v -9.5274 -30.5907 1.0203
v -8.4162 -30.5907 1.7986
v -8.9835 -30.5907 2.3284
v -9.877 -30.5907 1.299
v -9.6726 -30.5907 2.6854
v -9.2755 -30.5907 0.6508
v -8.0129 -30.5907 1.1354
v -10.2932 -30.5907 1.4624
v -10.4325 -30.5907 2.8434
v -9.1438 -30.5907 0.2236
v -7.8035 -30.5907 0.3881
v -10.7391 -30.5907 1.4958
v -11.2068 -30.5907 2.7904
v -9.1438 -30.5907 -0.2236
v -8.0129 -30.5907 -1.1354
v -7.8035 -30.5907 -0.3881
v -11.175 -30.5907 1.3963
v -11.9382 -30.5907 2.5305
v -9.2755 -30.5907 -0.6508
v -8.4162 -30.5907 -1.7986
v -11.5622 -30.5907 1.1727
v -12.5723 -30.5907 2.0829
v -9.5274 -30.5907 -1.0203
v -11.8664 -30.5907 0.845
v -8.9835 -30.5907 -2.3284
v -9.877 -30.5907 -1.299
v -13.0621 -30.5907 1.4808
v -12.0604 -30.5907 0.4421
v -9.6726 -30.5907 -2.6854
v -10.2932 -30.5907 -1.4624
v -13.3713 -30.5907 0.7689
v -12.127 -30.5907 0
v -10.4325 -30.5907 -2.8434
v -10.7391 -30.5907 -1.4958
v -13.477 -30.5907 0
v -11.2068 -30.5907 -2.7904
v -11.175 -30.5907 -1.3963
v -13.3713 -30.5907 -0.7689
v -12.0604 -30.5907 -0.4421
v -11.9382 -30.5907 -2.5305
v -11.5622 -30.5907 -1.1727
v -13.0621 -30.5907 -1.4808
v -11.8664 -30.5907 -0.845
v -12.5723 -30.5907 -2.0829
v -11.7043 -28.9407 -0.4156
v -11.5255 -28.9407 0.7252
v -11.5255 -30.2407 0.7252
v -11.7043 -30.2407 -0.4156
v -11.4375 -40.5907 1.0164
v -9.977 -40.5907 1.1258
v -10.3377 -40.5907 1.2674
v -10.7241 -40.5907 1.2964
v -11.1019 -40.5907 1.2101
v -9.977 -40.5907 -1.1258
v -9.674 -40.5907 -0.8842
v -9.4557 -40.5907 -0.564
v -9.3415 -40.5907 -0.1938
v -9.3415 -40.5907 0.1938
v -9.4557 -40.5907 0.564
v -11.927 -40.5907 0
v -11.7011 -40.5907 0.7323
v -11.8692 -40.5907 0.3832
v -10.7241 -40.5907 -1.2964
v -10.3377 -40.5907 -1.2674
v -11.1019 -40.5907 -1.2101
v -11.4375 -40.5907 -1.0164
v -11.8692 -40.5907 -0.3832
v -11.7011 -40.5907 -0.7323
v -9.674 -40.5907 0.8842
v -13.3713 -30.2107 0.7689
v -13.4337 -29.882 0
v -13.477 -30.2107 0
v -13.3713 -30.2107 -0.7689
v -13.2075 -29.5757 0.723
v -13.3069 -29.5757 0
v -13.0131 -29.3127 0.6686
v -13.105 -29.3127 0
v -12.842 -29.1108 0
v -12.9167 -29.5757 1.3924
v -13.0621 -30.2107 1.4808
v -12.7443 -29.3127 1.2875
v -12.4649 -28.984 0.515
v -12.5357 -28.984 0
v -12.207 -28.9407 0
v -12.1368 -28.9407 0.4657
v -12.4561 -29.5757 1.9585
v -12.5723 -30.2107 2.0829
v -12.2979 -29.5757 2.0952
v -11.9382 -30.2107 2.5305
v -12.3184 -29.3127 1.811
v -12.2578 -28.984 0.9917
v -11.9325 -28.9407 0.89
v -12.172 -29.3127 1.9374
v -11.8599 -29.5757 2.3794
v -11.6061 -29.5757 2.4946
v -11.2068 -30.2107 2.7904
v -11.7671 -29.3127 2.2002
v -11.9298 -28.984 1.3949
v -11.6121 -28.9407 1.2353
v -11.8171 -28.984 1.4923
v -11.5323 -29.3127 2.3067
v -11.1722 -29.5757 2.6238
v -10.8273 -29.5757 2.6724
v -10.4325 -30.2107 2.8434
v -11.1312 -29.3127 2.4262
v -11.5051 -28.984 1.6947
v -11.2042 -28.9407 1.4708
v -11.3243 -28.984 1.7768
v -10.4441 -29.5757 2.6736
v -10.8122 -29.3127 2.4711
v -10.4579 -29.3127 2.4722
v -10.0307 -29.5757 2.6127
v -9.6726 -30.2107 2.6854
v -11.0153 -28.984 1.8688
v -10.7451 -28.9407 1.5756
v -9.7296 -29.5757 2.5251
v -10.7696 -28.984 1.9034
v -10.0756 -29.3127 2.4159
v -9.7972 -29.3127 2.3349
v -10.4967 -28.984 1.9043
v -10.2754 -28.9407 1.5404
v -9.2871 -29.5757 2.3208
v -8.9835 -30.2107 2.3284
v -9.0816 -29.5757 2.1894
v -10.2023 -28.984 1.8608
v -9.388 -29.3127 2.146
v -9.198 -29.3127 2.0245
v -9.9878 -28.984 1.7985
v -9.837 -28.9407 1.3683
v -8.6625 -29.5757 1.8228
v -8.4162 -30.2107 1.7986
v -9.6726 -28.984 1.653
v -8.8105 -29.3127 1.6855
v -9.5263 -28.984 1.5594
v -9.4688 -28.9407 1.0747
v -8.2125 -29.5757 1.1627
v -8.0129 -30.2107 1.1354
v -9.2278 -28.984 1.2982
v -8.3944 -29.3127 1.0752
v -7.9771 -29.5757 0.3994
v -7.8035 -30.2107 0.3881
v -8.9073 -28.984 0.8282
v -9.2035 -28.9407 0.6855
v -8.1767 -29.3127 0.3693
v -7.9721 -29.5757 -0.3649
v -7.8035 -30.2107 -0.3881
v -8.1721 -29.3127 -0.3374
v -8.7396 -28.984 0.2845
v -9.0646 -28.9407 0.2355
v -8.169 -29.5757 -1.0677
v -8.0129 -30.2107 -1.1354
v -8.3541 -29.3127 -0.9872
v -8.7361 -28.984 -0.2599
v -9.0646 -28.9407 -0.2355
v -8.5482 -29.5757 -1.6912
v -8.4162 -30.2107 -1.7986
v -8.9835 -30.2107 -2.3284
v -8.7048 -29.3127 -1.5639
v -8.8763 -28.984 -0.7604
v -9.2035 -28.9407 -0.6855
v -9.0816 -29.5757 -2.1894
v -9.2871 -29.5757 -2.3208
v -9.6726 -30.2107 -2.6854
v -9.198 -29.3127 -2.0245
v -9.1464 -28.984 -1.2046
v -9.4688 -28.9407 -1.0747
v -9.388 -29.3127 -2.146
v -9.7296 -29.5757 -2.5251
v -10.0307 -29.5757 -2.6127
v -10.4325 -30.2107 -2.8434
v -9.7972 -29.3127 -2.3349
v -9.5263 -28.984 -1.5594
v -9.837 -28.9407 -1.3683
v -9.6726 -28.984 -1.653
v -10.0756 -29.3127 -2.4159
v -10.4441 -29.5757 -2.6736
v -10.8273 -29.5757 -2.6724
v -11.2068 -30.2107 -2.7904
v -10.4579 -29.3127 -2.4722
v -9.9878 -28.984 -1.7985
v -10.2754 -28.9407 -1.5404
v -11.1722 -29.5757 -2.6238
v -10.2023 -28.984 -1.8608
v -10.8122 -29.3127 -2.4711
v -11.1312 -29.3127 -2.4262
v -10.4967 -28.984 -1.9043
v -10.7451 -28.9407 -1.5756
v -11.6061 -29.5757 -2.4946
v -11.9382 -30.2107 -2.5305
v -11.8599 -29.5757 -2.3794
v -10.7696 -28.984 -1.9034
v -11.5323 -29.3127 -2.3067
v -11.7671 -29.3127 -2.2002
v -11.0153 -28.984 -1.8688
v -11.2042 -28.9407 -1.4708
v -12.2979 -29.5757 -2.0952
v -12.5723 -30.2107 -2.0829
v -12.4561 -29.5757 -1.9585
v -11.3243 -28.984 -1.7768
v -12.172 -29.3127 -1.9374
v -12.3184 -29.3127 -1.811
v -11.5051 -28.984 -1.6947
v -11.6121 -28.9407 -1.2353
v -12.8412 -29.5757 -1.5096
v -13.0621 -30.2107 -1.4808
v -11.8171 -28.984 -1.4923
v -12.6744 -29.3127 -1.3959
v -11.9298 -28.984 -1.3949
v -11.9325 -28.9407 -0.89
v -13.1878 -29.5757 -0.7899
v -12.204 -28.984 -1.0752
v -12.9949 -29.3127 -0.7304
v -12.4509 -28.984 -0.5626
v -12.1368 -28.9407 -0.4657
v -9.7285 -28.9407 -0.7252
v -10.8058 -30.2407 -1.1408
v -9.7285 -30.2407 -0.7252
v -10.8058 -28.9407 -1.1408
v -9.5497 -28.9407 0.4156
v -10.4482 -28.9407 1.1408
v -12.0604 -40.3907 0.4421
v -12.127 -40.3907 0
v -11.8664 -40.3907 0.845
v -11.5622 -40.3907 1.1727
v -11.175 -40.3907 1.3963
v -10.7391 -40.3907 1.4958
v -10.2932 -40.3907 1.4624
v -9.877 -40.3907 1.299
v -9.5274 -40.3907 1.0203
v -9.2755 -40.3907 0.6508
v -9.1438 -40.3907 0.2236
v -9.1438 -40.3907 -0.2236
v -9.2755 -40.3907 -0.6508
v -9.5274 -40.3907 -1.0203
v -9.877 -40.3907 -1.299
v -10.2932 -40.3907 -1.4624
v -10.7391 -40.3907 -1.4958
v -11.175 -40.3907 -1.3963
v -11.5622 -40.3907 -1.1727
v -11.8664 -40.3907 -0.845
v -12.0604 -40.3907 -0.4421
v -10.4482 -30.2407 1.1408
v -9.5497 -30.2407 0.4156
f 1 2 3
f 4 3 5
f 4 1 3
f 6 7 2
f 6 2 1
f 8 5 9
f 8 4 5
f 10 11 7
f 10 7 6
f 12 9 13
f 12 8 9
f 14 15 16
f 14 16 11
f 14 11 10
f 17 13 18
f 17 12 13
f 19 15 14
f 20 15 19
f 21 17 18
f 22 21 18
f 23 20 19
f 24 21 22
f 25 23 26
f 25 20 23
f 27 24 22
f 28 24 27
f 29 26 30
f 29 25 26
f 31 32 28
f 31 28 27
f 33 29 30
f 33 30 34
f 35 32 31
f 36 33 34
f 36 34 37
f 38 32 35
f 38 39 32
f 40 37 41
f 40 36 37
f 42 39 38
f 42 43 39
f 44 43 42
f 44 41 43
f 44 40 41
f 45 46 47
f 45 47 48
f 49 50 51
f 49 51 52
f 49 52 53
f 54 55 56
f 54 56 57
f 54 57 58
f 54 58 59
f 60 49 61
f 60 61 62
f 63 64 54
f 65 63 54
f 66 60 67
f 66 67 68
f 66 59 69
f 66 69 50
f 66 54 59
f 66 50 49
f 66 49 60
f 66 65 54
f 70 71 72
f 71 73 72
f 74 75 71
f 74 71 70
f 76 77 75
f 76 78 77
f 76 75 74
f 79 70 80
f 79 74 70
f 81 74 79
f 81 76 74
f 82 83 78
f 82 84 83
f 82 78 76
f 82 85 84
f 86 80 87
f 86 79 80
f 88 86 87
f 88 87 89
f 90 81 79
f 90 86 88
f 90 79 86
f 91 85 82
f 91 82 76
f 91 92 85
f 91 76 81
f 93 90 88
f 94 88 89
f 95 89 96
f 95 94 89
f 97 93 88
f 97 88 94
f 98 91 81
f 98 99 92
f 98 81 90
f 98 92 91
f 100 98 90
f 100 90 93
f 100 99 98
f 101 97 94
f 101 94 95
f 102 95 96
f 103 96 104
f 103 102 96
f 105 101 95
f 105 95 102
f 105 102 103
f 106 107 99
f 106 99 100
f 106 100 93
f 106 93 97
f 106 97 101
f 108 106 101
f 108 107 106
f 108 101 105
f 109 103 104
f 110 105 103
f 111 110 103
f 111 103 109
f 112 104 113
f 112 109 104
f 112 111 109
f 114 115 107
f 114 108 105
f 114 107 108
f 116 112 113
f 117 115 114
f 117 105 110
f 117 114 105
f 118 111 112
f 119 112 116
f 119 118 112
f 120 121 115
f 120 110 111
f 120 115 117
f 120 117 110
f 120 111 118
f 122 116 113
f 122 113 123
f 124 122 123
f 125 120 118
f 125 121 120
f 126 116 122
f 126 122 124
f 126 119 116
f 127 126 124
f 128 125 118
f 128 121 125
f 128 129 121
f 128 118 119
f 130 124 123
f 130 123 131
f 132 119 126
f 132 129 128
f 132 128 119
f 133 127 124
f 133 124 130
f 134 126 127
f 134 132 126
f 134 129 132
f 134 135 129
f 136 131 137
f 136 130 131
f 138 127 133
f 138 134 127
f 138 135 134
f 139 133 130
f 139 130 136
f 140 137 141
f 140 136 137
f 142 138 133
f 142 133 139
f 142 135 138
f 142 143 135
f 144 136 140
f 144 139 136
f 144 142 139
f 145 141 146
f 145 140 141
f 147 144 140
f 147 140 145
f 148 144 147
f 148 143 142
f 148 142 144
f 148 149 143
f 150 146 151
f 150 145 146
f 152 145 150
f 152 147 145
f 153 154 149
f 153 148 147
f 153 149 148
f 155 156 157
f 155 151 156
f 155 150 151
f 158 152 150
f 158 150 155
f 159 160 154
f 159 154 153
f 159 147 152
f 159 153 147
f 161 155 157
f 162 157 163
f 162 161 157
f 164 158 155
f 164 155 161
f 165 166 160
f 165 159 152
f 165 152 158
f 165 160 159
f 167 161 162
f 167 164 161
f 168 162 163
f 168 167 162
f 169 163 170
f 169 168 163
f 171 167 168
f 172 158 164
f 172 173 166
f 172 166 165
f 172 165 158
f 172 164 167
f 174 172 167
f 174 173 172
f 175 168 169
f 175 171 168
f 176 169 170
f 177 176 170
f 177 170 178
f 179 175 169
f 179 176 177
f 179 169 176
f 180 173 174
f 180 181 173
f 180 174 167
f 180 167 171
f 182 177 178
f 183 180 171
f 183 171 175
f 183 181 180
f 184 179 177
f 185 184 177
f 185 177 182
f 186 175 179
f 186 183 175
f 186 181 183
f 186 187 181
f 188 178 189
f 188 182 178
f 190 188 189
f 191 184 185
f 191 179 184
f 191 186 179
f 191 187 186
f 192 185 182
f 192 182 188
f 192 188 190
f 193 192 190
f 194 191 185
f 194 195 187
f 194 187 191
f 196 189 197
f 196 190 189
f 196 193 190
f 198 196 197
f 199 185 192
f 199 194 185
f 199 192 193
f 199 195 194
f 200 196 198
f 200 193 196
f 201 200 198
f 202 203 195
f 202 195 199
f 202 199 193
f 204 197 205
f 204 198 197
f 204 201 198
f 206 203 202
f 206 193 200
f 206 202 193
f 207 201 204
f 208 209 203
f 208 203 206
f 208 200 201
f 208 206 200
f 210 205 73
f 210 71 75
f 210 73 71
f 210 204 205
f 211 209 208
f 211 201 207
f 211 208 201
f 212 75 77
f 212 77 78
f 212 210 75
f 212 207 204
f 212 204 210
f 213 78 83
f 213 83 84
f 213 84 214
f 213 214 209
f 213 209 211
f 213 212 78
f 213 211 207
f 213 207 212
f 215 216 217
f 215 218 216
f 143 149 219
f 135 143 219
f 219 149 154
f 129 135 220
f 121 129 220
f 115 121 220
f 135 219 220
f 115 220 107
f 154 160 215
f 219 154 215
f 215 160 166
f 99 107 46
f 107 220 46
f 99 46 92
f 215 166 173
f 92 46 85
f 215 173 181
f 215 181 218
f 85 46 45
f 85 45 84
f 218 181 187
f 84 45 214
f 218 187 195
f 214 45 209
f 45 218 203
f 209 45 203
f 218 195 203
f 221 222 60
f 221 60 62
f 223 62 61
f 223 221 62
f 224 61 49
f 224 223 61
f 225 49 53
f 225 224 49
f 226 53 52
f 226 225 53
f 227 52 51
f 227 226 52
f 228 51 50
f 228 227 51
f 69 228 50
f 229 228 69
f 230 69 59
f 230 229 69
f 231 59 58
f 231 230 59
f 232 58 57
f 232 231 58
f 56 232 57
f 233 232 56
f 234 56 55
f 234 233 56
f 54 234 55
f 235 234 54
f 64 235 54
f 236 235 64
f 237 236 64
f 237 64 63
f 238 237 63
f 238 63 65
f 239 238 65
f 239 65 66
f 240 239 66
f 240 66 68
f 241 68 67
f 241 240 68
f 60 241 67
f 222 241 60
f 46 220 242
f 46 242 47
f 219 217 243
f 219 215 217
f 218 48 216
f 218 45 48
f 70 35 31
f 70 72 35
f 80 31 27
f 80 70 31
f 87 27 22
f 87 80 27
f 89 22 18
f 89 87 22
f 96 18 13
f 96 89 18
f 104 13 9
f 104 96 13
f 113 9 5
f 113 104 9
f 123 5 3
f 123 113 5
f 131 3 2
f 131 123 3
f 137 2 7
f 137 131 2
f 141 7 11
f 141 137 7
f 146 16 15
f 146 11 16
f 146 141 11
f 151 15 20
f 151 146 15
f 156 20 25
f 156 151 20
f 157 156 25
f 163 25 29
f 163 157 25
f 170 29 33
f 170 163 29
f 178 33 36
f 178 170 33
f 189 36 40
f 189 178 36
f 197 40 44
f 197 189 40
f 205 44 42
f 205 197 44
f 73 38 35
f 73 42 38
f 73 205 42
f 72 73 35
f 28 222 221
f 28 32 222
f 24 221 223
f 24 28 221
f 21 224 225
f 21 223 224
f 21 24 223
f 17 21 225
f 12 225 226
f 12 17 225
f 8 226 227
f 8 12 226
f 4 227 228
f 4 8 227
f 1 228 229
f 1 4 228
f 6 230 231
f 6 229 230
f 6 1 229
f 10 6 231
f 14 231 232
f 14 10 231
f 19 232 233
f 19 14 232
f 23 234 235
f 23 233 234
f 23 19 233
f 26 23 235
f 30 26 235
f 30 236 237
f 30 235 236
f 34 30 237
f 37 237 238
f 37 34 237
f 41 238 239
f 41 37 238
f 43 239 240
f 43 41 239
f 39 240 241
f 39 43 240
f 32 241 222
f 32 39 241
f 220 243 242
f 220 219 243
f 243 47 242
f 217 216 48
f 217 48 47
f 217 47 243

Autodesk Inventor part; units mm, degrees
ref_plane "YZ Plane" through (0, 0, 0) normal (1, 0, 0) x (0, 1, 0)
ref_plane "XZ Plane" through (0, 0, 0) normal (0, 1, 0) x (-1, 0, 0)
ref_plane "XY Plane" through (0, 0, 0) normal (0, 0, 1) x (1, 0, 0)
sketch "Sketch1" plane through (0, 0, 0) normal (0, 0, 1) x (1, 0, 0)
  line L0 (-10.627, -30.5907) -> (-13.477, -30.5907)
  line L1 (-10.627, -30.5907) -> (-10.627, -40.5907)
  line L2 (-10.627, -40.5907) -> (-12.127, -40.5907)
  line L3 (-12.127, -40.5907) -> (-12.127, -30.5907)
  line L4 (-10.627, -30.5907) -> (-10.627, -26.5988)
  line L5 (-13.477, -30.5907) -> (-13.477, -30.2107)
  line L6 (-13.477, -30.2107) -> (-13.477, -28.9407)
  line L7 (-13.477, -28.9407) -> (-10.627, -28.9407)
  point P0 (0, 0)
  dimension "d0" = 2.85
  dimension "d2" = 10
  dimension "d3" = 1.5
  dimension "d18" = 0.38
  dimension "d19" = 1.65
revolve "Revolution1" add sketch "Sketch1" angle 360 about axis through (-10.627, -30.5907, 0) along (0, -1, 0)
chamfer "Chamfer2" distance 0.2 angle 45 1 edges at (-9.127, -40.5907, 0)
fillet "Empalme2" radius 1.27 1 edges at (-7.777, -28.9407, 0)
sketch "Boceto2" plane through (-10.627, -28.9407, 0) normal (0, 1, 0) x (1, 0, 0)
  line L0 (0.8985, 0.7252) -> (1.0773, -0.4156)
  line L1 (1.0773, -0.4156) -> (0.1788, -1.1408)
  line L2 (0.1788, -1.1408) -> (-0.8985, -0.7252)
  line L3 (-0.8985, -0.7252) -> (-1.0773, 0.4156)
  line L4 (-1.0773, 0.4156) -> (-0.1788, 1.1408)
  line L5 (-0.1788, 1.1408) -> (0.8985, 0.7252)
  point P0 (10.627, 0)
  point P1 (0, 0)
  dimension "d21" = 2
extrude "Extrusión1" cut sketch "Boceto2" against normal blind 1.3
thread "Rosca2" size "M3x0.5" class "6g" standard "ISO Metric profile" length 430
properties part number "Tornillo Allen cabeeza botón M3x10mm"
